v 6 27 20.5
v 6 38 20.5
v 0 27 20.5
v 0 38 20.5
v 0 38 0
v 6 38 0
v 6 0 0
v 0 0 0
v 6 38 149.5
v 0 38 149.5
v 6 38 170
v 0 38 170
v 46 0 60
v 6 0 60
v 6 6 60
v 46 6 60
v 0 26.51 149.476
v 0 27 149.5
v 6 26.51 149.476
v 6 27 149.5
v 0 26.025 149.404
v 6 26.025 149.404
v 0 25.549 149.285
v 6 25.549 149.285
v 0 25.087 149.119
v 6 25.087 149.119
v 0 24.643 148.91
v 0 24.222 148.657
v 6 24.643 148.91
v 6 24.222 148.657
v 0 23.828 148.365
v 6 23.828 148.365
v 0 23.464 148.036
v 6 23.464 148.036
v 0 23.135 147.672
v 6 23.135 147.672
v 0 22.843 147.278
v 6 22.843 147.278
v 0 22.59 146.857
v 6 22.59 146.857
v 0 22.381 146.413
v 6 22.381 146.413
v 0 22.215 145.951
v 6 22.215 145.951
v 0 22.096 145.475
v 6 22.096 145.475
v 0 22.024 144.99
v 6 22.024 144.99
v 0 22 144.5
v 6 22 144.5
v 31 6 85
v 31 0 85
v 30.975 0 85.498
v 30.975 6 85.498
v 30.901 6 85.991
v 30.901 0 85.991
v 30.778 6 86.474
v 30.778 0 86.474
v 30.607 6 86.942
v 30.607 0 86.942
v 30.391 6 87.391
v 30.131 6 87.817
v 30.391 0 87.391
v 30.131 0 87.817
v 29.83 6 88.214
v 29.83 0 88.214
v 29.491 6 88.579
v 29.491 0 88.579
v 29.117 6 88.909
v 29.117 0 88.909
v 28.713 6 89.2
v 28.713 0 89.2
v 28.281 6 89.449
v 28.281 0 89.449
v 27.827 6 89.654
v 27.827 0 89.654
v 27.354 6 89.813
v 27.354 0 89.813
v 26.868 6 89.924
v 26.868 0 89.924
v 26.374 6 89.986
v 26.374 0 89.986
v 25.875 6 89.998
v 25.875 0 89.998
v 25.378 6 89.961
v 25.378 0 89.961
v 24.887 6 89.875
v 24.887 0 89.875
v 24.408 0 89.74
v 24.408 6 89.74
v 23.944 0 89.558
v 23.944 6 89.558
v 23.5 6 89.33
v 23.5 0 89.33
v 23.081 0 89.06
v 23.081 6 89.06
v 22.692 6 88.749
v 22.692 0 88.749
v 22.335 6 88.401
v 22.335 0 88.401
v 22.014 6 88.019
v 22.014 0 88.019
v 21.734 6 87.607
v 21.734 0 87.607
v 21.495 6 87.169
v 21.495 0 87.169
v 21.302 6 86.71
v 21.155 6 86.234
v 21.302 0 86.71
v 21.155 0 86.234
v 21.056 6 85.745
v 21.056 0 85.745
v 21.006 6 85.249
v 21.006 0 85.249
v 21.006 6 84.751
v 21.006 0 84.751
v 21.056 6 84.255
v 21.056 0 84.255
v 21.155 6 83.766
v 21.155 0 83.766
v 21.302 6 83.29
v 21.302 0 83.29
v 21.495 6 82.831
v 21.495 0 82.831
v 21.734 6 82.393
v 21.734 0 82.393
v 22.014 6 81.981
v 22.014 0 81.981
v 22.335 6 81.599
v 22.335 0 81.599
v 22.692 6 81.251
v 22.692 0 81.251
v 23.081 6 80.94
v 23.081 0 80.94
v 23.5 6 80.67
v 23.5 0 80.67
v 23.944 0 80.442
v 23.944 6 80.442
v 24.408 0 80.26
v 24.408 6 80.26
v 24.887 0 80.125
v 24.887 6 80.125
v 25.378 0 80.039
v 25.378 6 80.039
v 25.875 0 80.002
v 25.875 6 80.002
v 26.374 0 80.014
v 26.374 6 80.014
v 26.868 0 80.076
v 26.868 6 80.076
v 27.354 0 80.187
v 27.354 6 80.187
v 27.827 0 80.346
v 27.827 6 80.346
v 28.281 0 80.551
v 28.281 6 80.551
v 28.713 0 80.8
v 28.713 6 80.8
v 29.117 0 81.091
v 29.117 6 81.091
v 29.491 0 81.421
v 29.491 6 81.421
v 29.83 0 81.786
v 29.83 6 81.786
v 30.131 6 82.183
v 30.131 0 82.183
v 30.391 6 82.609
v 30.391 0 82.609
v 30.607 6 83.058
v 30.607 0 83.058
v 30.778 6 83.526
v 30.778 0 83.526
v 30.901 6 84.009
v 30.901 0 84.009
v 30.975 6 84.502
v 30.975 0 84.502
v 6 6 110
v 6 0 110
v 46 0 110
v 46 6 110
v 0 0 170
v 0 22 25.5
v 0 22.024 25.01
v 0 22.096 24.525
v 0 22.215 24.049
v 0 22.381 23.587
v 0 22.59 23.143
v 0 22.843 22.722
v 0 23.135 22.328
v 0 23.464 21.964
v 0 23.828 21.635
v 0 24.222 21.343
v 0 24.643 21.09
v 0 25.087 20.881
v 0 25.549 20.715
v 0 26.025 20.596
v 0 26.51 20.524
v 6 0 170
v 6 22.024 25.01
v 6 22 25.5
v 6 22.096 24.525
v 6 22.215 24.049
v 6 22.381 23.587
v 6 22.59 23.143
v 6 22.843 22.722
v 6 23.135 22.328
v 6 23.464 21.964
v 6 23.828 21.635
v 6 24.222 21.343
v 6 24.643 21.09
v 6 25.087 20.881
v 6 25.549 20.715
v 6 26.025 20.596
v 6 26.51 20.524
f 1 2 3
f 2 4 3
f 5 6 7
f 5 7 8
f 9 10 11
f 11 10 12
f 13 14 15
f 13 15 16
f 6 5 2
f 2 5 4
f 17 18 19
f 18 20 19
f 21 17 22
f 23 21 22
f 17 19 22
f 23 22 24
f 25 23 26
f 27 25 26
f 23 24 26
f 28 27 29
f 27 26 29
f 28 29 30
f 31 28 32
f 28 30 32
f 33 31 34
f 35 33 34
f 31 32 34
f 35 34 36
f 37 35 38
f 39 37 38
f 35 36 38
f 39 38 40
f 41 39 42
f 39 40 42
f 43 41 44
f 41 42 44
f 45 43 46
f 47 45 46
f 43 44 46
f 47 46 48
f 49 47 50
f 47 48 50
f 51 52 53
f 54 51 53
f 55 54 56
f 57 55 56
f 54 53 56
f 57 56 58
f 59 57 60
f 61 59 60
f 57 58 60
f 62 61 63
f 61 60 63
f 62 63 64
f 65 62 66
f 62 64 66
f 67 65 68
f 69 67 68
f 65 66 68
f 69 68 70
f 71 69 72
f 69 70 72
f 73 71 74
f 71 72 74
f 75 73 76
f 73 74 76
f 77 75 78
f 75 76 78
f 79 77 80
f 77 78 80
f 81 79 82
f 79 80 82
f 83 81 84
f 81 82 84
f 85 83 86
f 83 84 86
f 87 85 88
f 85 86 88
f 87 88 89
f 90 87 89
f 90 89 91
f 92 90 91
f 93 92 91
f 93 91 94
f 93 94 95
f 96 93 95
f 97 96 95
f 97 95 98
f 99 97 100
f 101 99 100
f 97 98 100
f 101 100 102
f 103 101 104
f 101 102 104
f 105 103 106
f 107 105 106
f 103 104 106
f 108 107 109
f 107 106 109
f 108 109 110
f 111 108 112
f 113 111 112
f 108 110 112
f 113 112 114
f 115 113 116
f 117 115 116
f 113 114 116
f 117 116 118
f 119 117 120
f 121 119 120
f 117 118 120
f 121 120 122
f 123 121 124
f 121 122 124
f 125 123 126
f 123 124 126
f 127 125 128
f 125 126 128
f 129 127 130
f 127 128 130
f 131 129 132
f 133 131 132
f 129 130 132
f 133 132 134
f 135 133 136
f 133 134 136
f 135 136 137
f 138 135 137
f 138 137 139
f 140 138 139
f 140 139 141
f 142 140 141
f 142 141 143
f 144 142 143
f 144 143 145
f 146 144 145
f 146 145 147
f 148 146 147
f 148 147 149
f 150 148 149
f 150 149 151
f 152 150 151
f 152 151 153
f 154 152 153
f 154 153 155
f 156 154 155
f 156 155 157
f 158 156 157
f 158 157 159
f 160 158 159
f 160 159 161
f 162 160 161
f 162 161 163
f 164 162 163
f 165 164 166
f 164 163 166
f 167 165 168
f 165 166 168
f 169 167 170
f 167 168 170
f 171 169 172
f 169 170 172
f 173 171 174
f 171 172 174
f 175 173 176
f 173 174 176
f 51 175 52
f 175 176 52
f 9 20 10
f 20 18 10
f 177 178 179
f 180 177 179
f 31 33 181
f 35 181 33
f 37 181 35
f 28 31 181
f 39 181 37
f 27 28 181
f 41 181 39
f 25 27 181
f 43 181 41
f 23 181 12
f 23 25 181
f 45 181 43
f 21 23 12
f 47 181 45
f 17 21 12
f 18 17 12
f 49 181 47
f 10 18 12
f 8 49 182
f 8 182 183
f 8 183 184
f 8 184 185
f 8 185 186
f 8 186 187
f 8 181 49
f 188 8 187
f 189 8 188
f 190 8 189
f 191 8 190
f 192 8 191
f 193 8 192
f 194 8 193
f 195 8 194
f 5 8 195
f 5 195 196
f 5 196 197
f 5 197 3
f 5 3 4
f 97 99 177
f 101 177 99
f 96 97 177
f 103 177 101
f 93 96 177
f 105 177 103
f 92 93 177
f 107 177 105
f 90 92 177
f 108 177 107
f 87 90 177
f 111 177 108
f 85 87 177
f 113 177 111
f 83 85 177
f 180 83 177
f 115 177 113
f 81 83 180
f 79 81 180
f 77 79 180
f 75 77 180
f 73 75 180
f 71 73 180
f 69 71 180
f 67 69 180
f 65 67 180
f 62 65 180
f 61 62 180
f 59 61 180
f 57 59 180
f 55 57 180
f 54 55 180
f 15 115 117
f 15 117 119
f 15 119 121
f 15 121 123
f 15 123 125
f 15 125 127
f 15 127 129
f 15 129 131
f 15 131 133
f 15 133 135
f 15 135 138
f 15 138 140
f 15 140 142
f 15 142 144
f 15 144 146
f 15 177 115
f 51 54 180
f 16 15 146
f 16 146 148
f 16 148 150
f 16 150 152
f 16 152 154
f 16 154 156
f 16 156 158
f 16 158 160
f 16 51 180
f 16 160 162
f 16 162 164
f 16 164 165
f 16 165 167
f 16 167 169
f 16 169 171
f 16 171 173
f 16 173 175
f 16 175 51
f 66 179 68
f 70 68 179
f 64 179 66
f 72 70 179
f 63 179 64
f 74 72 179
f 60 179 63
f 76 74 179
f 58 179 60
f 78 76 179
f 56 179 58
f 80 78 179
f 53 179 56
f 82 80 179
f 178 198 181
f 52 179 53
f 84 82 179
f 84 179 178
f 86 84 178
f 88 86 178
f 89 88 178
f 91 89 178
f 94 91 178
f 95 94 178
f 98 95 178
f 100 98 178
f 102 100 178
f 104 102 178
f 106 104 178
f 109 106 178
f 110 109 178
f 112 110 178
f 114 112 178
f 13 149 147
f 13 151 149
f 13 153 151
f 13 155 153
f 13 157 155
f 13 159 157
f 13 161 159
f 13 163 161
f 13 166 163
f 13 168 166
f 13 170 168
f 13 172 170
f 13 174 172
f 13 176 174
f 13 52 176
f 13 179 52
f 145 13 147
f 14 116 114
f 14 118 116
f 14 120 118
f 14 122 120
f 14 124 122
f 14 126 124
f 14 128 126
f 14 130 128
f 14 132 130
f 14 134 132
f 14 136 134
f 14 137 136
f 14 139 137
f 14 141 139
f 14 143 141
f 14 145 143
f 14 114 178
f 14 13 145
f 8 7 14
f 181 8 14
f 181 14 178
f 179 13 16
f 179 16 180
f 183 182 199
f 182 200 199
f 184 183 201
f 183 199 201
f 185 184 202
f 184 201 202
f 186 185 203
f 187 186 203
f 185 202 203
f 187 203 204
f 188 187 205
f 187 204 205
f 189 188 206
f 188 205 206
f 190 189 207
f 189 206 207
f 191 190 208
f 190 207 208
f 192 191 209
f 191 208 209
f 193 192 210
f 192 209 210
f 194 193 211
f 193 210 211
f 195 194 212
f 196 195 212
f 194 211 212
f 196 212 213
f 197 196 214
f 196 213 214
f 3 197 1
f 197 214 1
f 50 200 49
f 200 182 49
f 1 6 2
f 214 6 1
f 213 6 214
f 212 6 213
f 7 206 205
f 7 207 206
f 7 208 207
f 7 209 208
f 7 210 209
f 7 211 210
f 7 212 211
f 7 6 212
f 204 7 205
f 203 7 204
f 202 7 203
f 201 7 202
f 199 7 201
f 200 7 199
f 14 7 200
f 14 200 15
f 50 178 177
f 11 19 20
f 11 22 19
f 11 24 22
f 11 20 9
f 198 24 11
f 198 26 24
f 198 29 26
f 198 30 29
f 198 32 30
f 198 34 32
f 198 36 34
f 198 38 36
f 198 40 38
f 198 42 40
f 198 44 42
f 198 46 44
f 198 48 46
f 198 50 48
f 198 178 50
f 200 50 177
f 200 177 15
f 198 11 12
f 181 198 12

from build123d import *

# Parameters (mm, degrees)
SALIENTE_EXTRUIR1_DEPTH = 170
CROQUIS2_W              = 55
CROQUIS2_H              = 28
CORTAR_EXTRUIR1_DEPTH   = 6
CROQUIS3_W              = 44
CROQUIS3_H              = 60
CORTAR_EXTRUIR2_DEPTH   = 6
CROQUIS4_W              = 4
CROQUIS4_H              = 50
CORTAR_EXTRUIR3_DEPTH   = 10
CROQUIS5_W              = 20.5
CROQUIS5_H              = 12
CROQUIS5_W_2            = 18
CORTAR_EXTRUIR4_DEPTH   = 6
CROQUIS6_W              = 129
CROQUIS6_H              = 16
CORTAR_EXTRUIR5_DEPTH   = 6
CROQUIS7_R              = 5
CORTAR_EXTRUIR6_DEPTH   = 6
REDONDEO1_R             = 5


with BuildPart() as part:
    # Croquis1 → Saliente-Extruir1 (new body)
    with BuildSketch(Plane.XY):
        Polygon((0, 0), (0, 50), (6, 50), (6, 6), (50, 6), (50, 0), align=None)
    extrude(amount=SALIENTE_EXTRUIR1_DEPTH)

    # Croquis2 → Cortar-Extruir1 (cut)
    with BuildSketch(Plane.ZY):
        with Locations((85, 36)):
            Rectangle(CROQUIS2_W, CROQUIS2_H)
        with BuildLine():
            Line((149.5, 35), (149.5, 50))
            Line((149.5, 50), (130.5, 50))
            Line((130.5, 50), (130.5, 35))
            ThreePointArc((130.5, 35), (140, 25.5), (149.5, 35))
        make_face()
        with BuildLine():
            Line((39.5, 35), (39.5, 50))
            Line((39.5, 50), (20.5, 50))
            Line((20.5, 50), (20.5, 35))
            ThreePointArc((20.5, 35), (30, 25.5), (39.5, 35))
        make_face()
    extrude(amount=-CORTAR_EXTRUIR1_DEPTH, mode=Mode.SUBTRACT)

    # Croquis3 → Cortar-Extruir2 (cut)
    with BuildSketch(Plane.XZ):
        with Locations((28, 140)):
            Rectangle(CROQUIS3_W, CROQUIS3_H)
        with Locations((28, 30)):
            Rectangle(CROQUIS3_W, CROQUIS3_H)
    extrude(amount=-CORTAR_EXTRUIR2_DEPTH, mode=Mode.SUBTRACT)

    # Croquis4 → Cortar-Extruir3 (cut)
    with BuildSketch(Plane.XZ):
        with Locations((48, 85)):
            Rectangle(CROQUIS4_W, CROQUIS4_H)
    extrude(amount=-CORTAR_EXTRUIR3_DEPTH, mode=Mode.SUBTRACT)

    # Croquis5 → Cortar-Extruir4 (cut)
    with BuildSketch(Plane.ZY):
        with Locations((159.75, 44)):
            Rectangle(CROQUIS5_W, CROQUIS5_H)
        with Locations((121.5, 44)):
            Rectangle(CROQUIS5_W_2, CROQUIS5_H)
        with Locations((48.5, 44)):
            Rectangle(CROQUIS5_W_2, CROQUIS5_H)
        with Locations((10.25, 44)):
            Rectangle(CROQUIS5_W, CROQUIS5_H)
    extrude(amount=-CORTAR_EXTRUIR4_DEPTH, mode=Mode.SUBTRACT)

    # Croquis6 → Cortar-Extruir5 (cut)
    with BuildSketch(Plane.ZY):
        with Locations((85, 30)):
            Rectangle(CROQUIS6_W, CROQUIS6_H)
    extrude(amount=-CORTAR_EXTRUIR5_DEPTH, mode=Mode.SUBTRACT)

    # Croquis7 → Cortar-Extruir6 (cut)
    with BuildSketch(Plane.XZ):
        with Locations((26, 85)):
            Circle(CROQUIS7_R)
    extrude(amount=-CORTAR_EXTRUIR6_DEPTH, mode=Mode.SUBTRACT)

    # Redondeo1
    redondeo1_edges = [part.edges().sort_by_distance(p)[0] for p in [
        (3, 22, 149.5),
        (3, 22, 20.5),
    ]]
    fillet(redondeo1_edges, radius=REDONDEO1_R)


solid = part.part
